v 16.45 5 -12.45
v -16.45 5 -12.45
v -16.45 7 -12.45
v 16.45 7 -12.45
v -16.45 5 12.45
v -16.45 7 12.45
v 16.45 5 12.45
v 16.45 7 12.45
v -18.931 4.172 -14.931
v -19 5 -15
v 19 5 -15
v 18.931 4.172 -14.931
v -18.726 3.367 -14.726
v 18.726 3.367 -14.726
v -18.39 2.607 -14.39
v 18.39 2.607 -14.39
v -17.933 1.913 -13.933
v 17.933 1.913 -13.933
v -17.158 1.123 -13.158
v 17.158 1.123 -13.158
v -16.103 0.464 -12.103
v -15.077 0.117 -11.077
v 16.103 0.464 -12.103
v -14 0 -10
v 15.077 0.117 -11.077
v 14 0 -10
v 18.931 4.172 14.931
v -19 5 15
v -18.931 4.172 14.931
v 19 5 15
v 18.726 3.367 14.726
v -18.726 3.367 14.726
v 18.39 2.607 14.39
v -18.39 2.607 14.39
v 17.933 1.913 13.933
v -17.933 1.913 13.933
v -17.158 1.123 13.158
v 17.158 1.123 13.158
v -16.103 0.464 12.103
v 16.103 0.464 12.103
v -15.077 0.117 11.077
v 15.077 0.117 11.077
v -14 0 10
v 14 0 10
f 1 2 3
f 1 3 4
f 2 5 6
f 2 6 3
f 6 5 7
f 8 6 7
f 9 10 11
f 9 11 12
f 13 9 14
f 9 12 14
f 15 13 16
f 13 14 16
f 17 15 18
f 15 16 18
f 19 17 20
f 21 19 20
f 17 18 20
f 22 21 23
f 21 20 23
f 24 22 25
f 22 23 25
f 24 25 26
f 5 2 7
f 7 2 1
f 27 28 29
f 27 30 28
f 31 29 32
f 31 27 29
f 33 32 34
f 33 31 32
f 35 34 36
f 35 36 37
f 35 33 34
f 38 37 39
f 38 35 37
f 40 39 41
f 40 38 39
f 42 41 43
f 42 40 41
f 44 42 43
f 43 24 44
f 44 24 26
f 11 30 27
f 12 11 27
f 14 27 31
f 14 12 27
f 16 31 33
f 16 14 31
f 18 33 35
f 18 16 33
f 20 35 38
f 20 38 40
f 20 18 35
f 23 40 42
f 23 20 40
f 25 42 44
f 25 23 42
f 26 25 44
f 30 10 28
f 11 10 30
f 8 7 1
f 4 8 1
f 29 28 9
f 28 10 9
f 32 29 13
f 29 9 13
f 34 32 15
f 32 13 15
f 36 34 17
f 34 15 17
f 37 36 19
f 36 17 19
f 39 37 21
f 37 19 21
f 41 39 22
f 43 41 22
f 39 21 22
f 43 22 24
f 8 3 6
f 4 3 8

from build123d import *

# Parameters (mm, degrees)
SKETCH1_W           = 38
SKETCH1_H           = 30
BOSS_EXTRUDE1_DEPTH = 5
SKETCH2_W           = 32.9
SKETCH2_H           = 24.9
BOSS_EXTRUDE2_DEPTH = 2
FILLET1_R           = 5


with BuildPart() as part:
    # Sketch1 → Boss-Extrude1 (new body)
    with BuildSketch(Plane(origin=(0, 0, 0), x_dir=(1, 0, 0), z_dir=(0, 1, 0))):
        Rectangle(SKETCH1_W, SKETCH1_H)
    extrude(amount=BOSS_EXTRUDE1_DEPTH)

    # Fillet1
    fillet1_edges = [part.edges().sort_by_distance(p)[0] for p in [
        (-19, 0, 0),
        (0, 0, 15),
        (19, 0, 0),
        (0, 0, -15),
    ]]
    fillet(fillet1_edges, radius=FILLET1_R - 0.0001)  # a hair under: the kernel refuses the full size


with BuildPart() as body_2:
    # Sketch2 → Boss-Extrude2 (new body)
    with BuildSketch(Plane(origin=(0, 5, 0), x_dir=(1, 0, 0), z_dir=(0, 1, 0))):
        Rectangle(SKETCH2_W, SKETCH2_H)
    extrude(amount=BOSS_EXTRUDE2_DEPTH)


solid = Compound([part.part, body_2.part])
